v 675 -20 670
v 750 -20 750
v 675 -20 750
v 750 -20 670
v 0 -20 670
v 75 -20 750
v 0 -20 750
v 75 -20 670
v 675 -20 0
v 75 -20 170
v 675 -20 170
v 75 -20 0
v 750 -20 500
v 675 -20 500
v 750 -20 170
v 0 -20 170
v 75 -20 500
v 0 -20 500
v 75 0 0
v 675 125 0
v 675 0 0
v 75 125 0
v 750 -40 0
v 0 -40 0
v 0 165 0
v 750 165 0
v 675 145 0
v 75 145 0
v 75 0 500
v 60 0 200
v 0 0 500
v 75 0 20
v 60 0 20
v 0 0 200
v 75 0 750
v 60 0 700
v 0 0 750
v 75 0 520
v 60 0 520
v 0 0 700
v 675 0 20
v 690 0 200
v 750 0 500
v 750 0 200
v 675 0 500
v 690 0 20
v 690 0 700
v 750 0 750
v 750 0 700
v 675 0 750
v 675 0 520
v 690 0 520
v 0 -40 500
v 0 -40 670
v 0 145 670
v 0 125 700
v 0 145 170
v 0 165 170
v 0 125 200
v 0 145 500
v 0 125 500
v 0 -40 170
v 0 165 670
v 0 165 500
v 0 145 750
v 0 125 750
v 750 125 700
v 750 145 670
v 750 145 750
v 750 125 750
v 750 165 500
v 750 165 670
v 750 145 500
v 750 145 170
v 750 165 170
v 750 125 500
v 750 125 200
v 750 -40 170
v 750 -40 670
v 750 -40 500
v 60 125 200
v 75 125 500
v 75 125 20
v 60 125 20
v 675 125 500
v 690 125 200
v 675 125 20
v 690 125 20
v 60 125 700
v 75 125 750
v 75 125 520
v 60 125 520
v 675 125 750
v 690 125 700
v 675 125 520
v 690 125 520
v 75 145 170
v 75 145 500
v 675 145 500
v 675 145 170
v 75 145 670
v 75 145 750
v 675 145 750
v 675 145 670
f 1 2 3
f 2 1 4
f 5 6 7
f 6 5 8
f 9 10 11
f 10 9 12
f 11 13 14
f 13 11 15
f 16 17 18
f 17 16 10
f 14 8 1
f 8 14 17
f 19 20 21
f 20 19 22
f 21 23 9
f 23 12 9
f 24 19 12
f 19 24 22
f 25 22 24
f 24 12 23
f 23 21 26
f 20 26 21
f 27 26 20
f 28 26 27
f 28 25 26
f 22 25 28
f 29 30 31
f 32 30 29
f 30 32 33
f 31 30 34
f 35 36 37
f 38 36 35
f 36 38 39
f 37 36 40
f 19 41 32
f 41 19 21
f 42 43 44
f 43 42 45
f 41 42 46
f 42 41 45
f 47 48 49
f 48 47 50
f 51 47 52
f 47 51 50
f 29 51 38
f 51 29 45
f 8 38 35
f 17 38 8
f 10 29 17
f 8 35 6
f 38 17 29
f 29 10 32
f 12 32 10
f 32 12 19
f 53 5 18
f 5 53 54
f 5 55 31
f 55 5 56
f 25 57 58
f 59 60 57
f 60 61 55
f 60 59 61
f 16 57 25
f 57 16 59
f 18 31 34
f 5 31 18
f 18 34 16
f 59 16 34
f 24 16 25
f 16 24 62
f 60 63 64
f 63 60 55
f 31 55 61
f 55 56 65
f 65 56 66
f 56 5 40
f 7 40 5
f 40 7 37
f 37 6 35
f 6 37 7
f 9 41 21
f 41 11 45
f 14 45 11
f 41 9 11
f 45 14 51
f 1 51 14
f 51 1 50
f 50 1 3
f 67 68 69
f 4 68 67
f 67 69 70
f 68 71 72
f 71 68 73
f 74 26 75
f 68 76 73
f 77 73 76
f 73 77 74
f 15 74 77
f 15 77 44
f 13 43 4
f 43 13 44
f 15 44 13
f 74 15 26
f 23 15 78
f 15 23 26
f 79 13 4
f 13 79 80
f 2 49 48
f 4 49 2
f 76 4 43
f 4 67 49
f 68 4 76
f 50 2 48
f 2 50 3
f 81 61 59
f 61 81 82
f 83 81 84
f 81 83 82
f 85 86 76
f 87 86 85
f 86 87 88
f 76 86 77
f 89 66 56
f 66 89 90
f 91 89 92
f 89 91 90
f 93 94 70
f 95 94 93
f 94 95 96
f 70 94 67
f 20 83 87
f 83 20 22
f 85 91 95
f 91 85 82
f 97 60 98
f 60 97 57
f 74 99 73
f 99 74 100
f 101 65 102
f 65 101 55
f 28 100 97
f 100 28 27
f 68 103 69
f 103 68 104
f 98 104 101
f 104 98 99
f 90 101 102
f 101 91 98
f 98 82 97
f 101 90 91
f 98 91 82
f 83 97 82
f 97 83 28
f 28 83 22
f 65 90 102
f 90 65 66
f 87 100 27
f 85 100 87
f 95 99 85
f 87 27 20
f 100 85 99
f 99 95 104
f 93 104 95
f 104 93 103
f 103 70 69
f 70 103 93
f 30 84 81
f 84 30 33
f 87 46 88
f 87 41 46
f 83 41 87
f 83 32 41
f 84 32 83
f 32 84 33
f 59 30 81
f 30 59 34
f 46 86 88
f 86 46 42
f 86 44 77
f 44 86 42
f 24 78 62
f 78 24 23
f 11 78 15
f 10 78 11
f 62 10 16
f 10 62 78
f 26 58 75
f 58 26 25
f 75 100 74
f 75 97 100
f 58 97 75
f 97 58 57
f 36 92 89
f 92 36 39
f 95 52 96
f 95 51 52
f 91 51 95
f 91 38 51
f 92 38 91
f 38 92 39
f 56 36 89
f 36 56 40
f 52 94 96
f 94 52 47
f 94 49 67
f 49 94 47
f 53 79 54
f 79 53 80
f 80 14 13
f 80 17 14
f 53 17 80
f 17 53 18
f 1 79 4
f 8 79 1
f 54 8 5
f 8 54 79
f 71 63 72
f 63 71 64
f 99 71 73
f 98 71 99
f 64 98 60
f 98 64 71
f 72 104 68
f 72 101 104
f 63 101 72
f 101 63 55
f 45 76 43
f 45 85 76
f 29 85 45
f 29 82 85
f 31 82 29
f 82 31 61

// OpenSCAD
//vertical bretter
translate([75,0,0]) rotate([90,-90,0]) cube([750,75,20]); //small brett
translate([750,0,0]) rotate([90,-90,0]) cube([750,75,20]); //small brett
translate([75,125+20,0]) rotate([90,-90,0]) cube([750,75,20]); //small brett
translate([750,125+20,0]) rotate([90,-90,0]) cube([750,75,20]); //small brett

height1 = 0;
height2 = 500;

//topf unten
translate([0,0,height1+20]) rotate([0,0,0]) cube([60,125,60]); //block
translate([0,0,height1+20+60]) rotate([0,0,0]) cube([60,125,60]); //block
translate([0,0,height1+20+120]) rotate([0,0,0]) cube([60,125,60]); //block

translate([750-60,0,height1+20]) rotate([0,0,0]) cube([60,125,60]); //block
translate([750-60,0,height1+20+60]) rotate([0,0,0]) cube([60,125,60]); //block
translate([750-60,0,height1+20+120]) rotate([0,0,0]) cube([60,125,60]); //block

translate([0,-20,height1+0]) rotate([90,0,0]) cube([750,95,20]); //middle brett
translate([0,-20,height1+95]) rotate([90,0,0]) cube([750,75,20]); //small brett

translate([0,165,height1+0]) rotate([90,0,0]) cube([750,95,20]); //middle brett
translate([0,165,height1+95]) rotate([90,0,0]) cube([750,75,20]); //small brett

translate([0,0,height1+0]) rotate([0,0,0]) cube([750,125,20]); //wide brett


//topf oben
translate([0,0,height2+20]) rotate([0,0,0]) cube([60,125,60]); //block
translate([0,0,height2+20+60]) rotate([0,0,0]) cube([60,125,60]); //block
translate([0,0,height2+20+120]) rotate([0,0,0]) cube([60,125,60]); //block

translate([750-60,0,height2+20]) rotate([0,0,0]) cube([60,125,60]); //block
translate([750-60,0,height2+20+60]) rotate([0,0,0]) cube([60,125,60]); //block
translate([750-60,0,height2+20+120]) rotate([0,0,0]) cube([60,125,60]); //block

translate([0,-20,height2+0]) rotate([90,0,0]) cube([750,95,20]); //middle brett
translate([0,-20,height2+95]) rotate([90,0,0]) cube([750,75,20]); //small brett

translate([0,165,height2+0]) rotate([90,0,0]) cube([750,95,20]); //middle brett
translate([0,165,height2+95]) rotate([90,0,0]) cube([750,75,20]); //small brett

translate([0,0,height2+0]) rotate([0,0,0]) cube([750,125,20]); //wide brett
